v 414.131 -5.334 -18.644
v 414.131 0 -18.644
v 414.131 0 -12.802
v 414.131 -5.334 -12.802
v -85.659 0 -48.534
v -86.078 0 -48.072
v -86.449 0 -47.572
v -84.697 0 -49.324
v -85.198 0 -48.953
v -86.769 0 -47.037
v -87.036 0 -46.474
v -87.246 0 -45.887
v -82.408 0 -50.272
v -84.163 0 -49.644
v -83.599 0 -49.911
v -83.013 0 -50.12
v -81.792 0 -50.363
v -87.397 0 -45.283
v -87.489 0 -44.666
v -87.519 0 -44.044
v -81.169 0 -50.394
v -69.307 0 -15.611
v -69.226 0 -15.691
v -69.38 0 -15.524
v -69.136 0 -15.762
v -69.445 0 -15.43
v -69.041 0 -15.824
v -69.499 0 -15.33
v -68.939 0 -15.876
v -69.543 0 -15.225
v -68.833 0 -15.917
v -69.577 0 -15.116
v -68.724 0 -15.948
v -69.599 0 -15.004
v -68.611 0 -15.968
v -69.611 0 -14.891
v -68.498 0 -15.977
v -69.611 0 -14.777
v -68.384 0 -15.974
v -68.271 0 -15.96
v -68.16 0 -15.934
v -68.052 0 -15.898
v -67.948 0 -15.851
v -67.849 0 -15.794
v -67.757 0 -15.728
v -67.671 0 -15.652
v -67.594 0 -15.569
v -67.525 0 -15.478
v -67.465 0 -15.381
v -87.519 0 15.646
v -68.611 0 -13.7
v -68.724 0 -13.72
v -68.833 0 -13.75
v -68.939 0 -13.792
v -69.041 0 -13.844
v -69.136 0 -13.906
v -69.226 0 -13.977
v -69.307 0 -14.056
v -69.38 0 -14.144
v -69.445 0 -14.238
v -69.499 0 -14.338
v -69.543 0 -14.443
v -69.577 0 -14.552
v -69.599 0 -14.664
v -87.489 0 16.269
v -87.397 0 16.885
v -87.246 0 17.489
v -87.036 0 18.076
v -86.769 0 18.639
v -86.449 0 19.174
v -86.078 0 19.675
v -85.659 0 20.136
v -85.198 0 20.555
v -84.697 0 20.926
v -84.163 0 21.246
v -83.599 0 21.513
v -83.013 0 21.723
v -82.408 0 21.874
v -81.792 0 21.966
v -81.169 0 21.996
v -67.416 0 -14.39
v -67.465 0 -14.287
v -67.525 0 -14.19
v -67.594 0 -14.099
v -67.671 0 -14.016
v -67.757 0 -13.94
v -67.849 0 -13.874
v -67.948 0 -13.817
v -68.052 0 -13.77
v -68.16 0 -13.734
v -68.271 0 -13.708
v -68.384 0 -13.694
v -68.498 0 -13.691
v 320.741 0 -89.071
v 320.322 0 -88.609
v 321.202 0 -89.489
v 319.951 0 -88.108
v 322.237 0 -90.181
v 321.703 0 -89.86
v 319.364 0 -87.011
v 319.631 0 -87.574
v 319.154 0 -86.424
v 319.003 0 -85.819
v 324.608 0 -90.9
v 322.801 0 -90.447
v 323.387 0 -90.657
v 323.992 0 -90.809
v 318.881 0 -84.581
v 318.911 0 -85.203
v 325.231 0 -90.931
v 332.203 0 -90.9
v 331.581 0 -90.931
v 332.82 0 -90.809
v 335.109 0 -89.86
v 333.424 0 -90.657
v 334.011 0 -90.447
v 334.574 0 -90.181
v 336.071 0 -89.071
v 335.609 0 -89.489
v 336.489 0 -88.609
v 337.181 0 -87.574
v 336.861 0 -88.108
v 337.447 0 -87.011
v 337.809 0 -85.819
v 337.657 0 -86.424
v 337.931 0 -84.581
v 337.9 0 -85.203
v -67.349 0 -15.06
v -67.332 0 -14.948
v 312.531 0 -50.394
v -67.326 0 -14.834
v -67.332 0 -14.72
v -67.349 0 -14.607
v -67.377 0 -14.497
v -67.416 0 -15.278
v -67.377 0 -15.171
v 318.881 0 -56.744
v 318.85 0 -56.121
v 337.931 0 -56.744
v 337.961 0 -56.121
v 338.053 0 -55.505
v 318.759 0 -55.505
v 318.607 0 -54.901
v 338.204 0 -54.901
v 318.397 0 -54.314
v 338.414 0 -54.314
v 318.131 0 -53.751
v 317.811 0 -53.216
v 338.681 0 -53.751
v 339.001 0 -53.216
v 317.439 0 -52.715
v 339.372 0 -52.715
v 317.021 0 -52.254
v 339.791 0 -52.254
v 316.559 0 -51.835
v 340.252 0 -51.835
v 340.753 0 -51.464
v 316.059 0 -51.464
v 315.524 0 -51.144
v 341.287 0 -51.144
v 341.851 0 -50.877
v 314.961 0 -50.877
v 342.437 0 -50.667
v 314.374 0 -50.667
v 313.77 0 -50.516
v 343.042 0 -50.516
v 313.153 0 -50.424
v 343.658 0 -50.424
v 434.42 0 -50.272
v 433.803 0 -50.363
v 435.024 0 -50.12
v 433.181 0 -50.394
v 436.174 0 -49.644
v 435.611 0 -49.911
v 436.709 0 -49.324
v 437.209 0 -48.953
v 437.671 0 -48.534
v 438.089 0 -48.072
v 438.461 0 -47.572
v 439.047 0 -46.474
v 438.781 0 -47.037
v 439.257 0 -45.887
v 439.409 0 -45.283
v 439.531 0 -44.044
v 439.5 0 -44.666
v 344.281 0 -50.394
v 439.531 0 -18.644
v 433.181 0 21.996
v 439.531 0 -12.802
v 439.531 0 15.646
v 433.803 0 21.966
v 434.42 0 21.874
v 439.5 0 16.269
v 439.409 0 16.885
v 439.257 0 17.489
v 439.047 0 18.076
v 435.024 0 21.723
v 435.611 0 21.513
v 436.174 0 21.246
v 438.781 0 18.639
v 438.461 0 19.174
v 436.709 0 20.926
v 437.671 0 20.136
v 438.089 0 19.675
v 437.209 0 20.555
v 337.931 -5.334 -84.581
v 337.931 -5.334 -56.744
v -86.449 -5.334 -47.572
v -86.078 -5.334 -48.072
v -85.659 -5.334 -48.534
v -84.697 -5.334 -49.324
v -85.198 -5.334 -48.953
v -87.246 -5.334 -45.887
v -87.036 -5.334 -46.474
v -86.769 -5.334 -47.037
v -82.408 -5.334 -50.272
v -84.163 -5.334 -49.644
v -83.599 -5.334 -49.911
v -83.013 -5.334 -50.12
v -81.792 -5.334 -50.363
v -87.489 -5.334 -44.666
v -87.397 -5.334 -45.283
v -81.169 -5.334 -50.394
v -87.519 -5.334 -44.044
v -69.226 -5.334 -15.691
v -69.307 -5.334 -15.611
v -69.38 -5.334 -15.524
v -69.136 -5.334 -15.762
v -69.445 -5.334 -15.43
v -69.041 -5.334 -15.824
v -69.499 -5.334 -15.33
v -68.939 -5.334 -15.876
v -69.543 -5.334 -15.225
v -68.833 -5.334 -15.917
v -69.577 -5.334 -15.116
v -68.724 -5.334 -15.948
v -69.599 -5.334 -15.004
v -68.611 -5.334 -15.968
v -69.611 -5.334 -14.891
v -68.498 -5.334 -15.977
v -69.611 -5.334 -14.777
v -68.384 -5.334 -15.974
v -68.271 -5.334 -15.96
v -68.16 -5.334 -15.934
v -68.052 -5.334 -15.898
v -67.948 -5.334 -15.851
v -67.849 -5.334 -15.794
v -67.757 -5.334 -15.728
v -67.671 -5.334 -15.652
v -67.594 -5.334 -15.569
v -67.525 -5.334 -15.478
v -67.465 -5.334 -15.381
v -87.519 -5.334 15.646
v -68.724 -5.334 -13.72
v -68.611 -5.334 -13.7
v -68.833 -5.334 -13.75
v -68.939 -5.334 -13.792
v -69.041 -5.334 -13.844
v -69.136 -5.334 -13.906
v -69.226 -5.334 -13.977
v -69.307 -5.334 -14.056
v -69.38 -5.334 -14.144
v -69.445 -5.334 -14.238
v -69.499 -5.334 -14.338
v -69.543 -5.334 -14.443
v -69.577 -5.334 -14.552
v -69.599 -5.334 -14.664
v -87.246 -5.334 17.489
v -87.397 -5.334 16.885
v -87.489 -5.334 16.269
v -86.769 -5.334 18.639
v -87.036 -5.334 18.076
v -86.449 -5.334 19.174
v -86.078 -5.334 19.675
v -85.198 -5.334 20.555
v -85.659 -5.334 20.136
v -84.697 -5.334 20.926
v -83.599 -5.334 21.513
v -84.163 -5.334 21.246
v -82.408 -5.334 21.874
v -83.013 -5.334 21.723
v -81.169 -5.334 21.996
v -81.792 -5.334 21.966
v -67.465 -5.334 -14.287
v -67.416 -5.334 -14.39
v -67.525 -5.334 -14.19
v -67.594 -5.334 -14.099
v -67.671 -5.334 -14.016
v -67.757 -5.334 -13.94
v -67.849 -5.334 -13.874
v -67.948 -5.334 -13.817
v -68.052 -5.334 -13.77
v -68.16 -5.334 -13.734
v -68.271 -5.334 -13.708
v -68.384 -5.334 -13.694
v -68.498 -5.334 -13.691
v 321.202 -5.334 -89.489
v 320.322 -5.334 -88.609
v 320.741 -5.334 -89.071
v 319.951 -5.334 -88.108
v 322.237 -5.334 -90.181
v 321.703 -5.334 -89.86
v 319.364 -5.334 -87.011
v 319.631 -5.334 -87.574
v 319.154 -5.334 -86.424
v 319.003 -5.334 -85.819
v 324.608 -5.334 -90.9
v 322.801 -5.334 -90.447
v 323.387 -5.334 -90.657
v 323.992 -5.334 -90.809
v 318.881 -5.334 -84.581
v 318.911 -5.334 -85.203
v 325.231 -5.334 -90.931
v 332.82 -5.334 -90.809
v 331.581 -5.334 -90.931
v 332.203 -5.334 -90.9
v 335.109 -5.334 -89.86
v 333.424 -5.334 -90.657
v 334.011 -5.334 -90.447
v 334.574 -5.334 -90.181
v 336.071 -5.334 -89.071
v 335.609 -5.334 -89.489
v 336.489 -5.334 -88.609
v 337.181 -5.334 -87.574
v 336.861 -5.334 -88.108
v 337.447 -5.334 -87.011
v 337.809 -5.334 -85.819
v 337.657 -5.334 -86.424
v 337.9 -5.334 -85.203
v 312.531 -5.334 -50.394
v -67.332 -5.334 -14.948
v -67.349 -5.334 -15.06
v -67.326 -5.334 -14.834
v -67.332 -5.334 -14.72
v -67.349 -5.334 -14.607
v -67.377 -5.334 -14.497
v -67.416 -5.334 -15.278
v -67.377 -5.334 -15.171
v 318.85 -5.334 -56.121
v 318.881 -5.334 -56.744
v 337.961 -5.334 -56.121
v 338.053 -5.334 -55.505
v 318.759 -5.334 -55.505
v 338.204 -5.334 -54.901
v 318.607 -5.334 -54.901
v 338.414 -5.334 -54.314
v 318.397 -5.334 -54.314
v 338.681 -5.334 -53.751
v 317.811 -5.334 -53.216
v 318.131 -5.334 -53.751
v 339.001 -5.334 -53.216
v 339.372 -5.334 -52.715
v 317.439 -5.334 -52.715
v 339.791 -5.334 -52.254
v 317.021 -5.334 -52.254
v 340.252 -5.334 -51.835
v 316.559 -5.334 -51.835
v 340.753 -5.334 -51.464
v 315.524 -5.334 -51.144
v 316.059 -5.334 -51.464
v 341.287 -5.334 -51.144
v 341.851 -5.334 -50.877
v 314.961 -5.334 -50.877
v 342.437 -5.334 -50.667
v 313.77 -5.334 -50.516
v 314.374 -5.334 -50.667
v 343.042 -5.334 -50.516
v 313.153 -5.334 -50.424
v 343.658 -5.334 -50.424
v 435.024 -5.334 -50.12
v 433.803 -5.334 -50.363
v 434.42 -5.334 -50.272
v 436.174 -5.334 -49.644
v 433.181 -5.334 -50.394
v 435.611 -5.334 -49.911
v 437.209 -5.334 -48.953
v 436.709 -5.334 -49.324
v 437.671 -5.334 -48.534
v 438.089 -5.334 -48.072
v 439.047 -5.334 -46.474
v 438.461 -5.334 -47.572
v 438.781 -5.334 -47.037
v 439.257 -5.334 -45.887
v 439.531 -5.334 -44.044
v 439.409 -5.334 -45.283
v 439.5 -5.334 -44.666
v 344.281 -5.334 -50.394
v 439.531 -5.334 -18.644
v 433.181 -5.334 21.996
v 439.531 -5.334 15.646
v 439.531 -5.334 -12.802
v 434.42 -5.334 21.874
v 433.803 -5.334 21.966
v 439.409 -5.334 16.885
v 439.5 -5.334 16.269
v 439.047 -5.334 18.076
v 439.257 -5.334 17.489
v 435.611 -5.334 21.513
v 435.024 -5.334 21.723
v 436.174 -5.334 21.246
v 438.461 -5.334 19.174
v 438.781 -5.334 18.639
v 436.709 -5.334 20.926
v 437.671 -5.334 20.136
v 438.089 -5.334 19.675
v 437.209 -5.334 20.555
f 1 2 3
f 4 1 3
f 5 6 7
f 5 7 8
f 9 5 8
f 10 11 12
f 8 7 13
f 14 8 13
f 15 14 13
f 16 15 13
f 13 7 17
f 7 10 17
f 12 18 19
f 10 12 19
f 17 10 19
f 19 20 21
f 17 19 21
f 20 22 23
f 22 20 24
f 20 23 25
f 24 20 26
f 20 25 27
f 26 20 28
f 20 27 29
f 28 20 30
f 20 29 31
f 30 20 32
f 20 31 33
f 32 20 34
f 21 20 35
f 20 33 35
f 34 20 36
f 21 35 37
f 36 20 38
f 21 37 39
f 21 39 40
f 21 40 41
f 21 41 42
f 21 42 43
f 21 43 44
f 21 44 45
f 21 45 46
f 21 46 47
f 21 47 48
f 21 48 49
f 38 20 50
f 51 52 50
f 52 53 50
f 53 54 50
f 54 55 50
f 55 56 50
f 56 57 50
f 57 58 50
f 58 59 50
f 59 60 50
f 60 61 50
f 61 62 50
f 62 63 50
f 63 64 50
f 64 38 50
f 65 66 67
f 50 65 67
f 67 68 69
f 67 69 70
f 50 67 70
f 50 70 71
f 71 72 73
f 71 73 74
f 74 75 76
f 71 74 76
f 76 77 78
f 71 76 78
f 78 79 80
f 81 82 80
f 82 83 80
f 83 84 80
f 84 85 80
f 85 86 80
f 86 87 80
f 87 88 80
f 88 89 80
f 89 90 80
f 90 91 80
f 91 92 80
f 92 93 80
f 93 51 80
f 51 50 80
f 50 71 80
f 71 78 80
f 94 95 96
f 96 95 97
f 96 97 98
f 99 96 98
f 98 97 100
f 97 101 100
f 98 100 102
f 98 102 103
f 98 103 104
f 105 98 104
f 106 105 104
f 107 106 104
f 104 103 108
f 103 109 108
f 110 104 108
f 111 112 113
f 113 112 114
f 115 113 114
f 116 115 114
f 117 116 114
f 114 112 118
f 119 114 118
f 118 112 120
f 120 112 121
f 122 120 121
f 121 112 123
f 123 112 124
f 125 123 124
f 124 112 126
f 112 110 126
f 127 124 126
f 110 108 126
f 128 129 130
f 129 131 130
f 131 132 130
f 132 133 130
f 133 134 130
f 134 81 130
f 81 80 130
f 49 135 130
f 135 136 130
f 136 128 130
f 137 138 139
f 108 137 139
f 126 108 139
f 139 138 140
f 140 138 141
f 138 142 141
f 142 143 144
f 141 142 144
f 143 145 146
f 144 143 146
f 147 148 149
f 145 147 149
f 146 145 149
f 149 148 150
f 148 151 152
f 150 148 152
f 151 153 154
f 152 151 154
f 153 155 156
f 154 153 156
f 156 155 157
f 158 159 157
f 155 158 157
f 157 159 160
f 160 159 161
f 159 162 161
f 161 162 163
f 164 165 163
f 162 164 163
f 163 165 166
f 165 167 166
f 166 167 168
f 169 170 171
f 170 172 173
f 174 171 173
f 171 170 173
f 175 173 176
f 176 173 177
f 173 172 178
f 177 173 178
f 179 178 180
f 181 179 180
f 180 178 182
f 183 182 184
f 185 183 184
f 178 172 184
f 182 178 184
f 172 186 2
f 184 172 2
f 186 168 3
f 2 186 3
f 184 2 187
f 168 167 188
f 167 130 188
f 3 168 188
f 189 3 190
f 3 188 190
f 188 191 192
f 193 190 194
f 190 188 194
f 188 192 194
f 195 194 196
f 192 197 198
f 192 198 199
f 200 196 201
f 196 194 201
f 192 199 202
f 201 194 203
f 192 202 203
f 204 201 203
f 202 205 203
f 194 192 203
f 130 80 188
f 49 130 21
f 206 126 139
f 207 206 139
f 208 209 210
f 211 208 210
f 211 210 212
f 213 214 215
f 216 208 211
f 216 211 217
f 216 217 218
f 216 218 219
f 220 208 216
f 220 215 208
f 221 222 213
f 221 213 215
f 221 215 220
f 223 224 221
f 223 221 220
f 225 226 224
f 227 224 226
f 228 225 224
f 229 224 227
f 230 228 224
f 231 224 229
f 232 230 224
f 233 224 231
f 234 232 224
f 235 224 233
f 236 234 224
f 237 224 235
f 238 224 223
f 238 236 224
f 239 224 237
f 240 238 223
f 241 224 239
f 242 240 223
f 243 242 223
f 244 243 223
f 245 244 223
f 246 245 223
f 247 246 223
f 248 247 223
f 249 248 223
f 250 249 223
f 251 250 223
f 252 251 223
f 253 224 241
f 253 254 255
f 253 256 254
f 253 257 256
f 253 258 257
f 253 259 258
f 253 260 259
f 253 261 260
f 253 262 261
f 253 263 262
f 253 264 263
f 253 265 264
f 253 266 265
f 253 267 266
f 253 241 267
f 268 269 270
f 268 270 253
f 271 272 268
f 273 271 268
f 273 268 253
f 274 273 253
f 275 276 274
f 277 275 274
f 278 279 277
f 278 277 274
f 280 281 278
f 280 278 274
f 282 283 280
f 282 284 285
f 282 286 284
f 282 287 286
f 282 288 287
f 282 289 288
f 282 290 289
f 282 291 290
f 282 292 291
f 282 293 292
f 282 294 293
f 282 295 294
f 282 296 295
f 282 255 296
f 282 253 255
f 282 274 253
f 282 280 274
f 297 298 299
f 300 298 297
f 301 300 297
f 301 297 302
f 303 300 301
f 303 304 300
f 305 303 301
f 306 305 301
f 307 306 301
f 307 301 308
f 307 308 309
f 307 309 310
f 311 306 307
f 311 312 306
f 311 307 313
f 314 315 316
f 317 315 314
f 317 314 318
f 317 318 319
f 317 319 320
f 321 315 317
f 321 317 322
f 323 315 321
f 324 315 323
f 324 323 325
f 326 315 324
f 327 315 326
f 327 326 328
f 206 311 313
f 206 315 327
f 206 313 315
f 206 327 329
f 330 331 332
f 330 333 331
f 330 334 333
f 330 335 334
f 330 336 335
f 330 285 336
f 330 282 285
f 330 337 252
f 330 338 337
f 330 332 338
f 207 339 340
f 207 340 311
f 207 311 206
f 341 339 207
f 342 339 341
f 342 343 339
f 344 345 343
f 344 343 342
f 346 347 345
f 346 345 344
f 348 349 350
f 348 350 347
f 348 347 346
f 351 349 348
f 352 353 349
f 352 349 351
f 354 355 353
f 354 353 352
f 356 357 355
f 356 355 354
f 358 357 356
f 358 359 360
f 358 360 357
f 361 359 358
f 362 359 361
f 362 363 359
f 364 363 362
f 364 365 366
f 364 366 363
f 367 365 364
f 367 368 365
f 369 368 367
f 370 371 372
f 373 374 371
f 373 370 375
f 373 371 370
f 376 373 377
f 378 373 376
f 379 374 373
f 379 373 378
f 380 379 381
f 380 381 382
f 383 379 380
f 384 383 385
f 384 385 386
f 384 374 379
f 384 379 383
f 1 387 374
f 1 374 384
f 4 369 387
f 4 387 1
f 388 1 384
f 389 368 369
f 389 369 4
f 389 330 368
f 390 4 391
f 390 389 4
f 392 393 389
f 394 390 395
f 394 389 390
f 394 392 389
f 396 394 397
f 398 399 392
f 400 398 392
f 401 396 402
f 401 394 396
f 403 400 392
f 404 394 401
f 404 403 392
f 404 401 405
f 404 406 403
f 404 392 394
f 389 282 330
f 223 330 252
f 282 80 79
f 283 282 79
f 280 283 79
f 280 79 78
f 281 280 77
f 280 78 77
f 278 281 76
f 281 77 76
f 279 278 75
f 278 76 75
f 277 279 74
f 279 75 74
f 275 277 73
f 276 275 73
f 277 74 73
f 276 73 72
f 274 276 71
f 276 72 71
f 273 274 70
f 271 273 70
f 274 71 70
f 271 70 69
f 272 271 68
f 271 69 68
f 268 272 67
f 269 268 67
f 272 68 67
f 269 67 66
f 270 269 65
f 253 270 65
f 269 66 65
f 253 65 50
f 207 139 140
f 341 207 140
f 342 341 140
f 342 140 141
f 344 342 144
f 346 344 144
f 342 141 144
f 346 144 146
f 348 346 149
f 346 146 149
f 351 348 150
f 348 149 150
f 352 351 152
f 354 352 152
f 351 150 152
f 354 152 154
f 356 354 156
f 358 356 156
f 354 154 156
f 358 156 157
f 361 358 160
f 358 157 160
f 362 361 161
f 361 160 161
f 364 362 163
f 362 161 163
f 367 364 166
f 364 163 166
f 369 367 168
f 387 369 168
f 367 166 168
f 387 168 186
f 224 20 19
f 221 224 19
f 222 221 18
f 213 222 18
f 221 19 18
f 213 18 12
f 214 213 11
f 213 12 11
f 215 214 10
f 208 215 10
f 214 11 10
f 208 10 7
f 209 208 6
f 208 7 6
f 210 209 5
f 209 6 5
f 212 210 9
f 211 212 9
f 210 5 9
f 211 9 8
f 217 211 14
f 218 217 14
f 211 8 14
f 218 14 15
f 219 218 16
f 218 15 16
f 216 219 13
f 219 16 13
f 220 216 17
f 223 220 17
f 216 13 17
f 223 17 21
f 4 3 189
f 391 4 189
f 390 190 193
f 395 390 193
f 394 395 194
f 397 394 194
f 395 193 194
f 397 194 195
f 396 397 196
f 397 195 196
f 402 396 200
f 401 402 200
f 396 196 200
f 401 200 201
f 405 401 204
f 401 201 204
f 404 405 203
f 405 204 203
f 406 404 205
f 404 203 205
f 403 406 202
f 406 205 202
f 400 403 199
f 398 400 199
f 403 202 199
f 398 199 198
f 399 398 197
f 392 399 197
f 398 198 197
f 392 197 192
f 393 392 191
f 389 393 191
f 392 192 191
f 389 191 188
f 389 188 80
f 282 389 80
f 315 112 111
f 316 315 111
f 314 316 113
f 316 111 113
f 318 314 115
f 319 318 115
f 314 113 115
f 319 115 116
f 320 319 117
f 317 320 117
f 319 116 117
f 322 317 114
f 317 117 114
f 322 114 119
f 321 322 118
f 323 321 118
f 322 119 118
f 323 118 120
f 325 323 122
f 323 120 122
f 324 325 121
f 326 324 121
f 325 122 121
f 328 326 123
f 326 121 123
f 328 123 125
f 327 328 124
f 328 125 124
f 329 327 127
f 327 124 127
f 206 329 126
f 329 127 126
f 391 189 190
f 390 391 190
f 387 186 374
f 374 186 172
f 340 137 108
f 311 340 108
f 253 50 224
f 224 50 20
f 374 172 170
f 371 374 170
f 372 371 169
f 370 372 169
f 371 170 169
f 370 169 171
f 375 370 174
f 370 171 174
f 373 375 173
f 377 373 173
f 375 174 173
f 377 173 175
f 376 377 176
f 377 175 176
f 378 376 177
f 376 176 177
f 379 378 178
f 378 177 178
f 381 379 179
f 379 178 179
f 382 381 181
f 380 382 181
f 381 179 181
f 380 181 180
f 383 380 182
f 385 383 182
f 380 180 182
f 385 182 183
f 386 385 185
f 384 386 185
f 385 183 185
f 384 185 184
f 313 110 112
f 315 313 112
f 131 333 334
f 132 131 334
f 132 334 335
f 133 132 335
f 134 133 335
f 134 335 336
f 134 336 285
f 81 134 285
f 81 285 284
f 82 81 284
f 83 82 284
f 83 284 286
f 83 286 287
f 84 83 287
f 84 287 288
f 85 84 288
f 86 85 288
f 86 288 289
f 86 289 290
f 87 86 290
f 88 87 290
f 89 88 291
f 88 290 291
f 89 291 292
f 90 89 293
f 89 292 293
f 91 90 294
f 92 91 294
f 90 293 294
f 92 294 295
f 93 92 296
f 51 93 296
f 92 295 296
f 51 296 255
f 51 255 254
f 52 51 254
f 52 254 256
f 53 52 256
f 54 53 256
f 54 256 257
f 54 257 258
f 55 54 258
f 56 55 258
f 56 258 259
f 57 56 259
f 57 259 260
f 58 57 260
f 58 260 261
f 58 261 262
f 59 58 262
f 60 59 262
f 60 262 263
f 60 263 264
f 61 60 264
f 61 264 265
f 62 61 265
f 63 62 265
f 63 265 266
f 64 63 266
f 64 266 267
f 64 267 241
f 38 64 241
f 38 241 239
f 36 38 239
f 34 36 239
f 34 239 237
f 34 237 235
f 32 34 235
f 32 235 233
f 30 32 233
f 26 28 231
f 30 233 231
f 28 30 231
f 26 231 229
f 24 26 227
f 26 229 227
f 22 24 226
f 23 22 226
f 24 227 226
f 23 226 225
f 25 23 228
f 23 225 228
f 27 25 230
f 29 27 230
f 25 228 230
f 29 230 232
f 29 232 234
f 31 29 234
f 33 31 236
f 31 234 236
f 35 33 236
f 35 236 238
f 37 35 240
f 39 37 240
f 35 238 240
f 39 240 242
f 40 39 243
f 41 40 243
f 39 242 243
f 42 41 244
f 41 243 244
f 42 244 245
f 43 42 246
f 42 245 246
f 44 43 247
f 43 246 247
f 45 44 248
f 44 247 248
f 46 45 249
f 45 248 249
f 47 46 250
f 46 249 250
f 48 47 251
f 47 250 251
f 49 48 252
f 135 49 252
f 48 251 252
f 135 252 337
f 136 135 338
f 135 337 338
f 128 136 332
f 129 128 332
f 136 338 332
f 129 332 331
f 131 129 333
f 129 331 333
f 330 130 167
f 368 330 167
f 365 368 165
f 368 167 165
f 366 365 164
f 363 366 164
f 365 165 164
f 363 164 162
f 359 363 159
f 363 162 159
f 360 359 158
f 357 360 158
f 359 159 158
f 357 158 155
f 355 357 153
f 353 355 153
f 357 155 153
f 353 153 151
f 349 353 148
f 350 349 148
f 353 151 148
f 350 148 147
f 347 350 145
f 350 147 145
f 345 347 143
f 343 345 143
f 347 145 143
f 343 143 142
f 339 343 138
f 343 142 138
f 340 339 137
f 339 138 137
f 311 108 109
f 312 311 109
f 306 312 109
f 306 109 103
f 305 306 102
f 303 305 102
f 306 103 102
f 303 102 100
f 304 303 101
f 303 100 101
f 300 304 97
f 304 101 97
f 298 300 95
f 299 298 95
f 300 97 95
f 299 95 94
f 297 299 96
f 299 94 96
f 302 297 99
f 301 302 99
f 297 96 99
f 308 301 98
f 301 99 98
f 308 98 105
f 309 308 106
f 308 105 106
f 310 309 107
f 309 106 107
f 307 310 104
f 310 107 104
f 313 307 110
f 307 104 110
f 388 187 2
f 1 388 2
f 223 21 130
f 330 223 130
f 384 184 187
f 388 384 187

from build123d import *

# Parameters (mm, degrees)
F1_DEPTH = 5.334
F2_R     = 1.143
F3_DEPTH = 25.4


with BuildPart() as f1:
    # F0 (on Front) → F1 (new body)
    with BuildSketch(Plane.XZ):
        with BuildLine():
            Line((433.180757, 21.996105), (-81.169243, 21.996105))
            ThreePointArc((-81.169243, 21.996105), (-85.659371, 20.136233), (-87.519243, 15.646105))
            Line((-87.519243, 15.646105), (-87.519243, -44.043895))
            ThreePointArc((-87.519243, -44.043895), (-85.659371, -48.534023), (-81.169243, -50.393895))
            Line((-81.169243, -50.393895), (312.530757, -50.393895))
            ThreePointArc((312.530757, -50.393895), (317.020885, -52.253767), (318.880757, -56.743895))
            Line((318.880757, -56.743895), (318.880757, -84.580526))
            ThreePointArc((318.880757, -84.580526), (320.740629, -89.070654), (325.230757, -90.930526))
            Line((325.230757, -90.930526), (331.580757, -90.930526))
            ThreePointArc((331.580757, -90.930526), (336.070885, -89.070654), (337.930757, -84.580526))
            Line((337.930757, -84.580526), (337.930757, -56.743895))
            ThreePointArc((337.930757, -56.743895), (339.790629, -52.253767), (344.280757, -50.393895))
            Line((344.280757, -50.393895), (433.180757, -50.393895))
            ThreePointArc((433.180757, -50.393895), (437.670885, -48.534023), (439.530757, -44.043895))
            Line((439.530757, -44.043895), (439.530757, -18.643895))
            Line((439.530757, -18.643895), (414.130757, -18.643895))
            Line((414.130757, -18.643895), (414.130757, -12.801895))
            Line((414.130757, -12.801895), (439.530757, -12.801895))
            Line((439.530757, -12.801895), (439.530757, 15.646105))
            ThreePointArc((439.530757, 15.646105), (437.670885, 20.136233), (433.180757, 21.996105))
        make_face()
    extrude(amount=F1_DEPTH)

    # F2 (on face) → F3 (cut)
    with BuildSketch(Plane.XZ.offset(5.334)):
        with Locations((-68.469243, -14.833895)):
            Circle(F2_R)
    extrude(amount=-F3_DEPTH, mode=Mode.SUBTRACT)


solid = f1.part
